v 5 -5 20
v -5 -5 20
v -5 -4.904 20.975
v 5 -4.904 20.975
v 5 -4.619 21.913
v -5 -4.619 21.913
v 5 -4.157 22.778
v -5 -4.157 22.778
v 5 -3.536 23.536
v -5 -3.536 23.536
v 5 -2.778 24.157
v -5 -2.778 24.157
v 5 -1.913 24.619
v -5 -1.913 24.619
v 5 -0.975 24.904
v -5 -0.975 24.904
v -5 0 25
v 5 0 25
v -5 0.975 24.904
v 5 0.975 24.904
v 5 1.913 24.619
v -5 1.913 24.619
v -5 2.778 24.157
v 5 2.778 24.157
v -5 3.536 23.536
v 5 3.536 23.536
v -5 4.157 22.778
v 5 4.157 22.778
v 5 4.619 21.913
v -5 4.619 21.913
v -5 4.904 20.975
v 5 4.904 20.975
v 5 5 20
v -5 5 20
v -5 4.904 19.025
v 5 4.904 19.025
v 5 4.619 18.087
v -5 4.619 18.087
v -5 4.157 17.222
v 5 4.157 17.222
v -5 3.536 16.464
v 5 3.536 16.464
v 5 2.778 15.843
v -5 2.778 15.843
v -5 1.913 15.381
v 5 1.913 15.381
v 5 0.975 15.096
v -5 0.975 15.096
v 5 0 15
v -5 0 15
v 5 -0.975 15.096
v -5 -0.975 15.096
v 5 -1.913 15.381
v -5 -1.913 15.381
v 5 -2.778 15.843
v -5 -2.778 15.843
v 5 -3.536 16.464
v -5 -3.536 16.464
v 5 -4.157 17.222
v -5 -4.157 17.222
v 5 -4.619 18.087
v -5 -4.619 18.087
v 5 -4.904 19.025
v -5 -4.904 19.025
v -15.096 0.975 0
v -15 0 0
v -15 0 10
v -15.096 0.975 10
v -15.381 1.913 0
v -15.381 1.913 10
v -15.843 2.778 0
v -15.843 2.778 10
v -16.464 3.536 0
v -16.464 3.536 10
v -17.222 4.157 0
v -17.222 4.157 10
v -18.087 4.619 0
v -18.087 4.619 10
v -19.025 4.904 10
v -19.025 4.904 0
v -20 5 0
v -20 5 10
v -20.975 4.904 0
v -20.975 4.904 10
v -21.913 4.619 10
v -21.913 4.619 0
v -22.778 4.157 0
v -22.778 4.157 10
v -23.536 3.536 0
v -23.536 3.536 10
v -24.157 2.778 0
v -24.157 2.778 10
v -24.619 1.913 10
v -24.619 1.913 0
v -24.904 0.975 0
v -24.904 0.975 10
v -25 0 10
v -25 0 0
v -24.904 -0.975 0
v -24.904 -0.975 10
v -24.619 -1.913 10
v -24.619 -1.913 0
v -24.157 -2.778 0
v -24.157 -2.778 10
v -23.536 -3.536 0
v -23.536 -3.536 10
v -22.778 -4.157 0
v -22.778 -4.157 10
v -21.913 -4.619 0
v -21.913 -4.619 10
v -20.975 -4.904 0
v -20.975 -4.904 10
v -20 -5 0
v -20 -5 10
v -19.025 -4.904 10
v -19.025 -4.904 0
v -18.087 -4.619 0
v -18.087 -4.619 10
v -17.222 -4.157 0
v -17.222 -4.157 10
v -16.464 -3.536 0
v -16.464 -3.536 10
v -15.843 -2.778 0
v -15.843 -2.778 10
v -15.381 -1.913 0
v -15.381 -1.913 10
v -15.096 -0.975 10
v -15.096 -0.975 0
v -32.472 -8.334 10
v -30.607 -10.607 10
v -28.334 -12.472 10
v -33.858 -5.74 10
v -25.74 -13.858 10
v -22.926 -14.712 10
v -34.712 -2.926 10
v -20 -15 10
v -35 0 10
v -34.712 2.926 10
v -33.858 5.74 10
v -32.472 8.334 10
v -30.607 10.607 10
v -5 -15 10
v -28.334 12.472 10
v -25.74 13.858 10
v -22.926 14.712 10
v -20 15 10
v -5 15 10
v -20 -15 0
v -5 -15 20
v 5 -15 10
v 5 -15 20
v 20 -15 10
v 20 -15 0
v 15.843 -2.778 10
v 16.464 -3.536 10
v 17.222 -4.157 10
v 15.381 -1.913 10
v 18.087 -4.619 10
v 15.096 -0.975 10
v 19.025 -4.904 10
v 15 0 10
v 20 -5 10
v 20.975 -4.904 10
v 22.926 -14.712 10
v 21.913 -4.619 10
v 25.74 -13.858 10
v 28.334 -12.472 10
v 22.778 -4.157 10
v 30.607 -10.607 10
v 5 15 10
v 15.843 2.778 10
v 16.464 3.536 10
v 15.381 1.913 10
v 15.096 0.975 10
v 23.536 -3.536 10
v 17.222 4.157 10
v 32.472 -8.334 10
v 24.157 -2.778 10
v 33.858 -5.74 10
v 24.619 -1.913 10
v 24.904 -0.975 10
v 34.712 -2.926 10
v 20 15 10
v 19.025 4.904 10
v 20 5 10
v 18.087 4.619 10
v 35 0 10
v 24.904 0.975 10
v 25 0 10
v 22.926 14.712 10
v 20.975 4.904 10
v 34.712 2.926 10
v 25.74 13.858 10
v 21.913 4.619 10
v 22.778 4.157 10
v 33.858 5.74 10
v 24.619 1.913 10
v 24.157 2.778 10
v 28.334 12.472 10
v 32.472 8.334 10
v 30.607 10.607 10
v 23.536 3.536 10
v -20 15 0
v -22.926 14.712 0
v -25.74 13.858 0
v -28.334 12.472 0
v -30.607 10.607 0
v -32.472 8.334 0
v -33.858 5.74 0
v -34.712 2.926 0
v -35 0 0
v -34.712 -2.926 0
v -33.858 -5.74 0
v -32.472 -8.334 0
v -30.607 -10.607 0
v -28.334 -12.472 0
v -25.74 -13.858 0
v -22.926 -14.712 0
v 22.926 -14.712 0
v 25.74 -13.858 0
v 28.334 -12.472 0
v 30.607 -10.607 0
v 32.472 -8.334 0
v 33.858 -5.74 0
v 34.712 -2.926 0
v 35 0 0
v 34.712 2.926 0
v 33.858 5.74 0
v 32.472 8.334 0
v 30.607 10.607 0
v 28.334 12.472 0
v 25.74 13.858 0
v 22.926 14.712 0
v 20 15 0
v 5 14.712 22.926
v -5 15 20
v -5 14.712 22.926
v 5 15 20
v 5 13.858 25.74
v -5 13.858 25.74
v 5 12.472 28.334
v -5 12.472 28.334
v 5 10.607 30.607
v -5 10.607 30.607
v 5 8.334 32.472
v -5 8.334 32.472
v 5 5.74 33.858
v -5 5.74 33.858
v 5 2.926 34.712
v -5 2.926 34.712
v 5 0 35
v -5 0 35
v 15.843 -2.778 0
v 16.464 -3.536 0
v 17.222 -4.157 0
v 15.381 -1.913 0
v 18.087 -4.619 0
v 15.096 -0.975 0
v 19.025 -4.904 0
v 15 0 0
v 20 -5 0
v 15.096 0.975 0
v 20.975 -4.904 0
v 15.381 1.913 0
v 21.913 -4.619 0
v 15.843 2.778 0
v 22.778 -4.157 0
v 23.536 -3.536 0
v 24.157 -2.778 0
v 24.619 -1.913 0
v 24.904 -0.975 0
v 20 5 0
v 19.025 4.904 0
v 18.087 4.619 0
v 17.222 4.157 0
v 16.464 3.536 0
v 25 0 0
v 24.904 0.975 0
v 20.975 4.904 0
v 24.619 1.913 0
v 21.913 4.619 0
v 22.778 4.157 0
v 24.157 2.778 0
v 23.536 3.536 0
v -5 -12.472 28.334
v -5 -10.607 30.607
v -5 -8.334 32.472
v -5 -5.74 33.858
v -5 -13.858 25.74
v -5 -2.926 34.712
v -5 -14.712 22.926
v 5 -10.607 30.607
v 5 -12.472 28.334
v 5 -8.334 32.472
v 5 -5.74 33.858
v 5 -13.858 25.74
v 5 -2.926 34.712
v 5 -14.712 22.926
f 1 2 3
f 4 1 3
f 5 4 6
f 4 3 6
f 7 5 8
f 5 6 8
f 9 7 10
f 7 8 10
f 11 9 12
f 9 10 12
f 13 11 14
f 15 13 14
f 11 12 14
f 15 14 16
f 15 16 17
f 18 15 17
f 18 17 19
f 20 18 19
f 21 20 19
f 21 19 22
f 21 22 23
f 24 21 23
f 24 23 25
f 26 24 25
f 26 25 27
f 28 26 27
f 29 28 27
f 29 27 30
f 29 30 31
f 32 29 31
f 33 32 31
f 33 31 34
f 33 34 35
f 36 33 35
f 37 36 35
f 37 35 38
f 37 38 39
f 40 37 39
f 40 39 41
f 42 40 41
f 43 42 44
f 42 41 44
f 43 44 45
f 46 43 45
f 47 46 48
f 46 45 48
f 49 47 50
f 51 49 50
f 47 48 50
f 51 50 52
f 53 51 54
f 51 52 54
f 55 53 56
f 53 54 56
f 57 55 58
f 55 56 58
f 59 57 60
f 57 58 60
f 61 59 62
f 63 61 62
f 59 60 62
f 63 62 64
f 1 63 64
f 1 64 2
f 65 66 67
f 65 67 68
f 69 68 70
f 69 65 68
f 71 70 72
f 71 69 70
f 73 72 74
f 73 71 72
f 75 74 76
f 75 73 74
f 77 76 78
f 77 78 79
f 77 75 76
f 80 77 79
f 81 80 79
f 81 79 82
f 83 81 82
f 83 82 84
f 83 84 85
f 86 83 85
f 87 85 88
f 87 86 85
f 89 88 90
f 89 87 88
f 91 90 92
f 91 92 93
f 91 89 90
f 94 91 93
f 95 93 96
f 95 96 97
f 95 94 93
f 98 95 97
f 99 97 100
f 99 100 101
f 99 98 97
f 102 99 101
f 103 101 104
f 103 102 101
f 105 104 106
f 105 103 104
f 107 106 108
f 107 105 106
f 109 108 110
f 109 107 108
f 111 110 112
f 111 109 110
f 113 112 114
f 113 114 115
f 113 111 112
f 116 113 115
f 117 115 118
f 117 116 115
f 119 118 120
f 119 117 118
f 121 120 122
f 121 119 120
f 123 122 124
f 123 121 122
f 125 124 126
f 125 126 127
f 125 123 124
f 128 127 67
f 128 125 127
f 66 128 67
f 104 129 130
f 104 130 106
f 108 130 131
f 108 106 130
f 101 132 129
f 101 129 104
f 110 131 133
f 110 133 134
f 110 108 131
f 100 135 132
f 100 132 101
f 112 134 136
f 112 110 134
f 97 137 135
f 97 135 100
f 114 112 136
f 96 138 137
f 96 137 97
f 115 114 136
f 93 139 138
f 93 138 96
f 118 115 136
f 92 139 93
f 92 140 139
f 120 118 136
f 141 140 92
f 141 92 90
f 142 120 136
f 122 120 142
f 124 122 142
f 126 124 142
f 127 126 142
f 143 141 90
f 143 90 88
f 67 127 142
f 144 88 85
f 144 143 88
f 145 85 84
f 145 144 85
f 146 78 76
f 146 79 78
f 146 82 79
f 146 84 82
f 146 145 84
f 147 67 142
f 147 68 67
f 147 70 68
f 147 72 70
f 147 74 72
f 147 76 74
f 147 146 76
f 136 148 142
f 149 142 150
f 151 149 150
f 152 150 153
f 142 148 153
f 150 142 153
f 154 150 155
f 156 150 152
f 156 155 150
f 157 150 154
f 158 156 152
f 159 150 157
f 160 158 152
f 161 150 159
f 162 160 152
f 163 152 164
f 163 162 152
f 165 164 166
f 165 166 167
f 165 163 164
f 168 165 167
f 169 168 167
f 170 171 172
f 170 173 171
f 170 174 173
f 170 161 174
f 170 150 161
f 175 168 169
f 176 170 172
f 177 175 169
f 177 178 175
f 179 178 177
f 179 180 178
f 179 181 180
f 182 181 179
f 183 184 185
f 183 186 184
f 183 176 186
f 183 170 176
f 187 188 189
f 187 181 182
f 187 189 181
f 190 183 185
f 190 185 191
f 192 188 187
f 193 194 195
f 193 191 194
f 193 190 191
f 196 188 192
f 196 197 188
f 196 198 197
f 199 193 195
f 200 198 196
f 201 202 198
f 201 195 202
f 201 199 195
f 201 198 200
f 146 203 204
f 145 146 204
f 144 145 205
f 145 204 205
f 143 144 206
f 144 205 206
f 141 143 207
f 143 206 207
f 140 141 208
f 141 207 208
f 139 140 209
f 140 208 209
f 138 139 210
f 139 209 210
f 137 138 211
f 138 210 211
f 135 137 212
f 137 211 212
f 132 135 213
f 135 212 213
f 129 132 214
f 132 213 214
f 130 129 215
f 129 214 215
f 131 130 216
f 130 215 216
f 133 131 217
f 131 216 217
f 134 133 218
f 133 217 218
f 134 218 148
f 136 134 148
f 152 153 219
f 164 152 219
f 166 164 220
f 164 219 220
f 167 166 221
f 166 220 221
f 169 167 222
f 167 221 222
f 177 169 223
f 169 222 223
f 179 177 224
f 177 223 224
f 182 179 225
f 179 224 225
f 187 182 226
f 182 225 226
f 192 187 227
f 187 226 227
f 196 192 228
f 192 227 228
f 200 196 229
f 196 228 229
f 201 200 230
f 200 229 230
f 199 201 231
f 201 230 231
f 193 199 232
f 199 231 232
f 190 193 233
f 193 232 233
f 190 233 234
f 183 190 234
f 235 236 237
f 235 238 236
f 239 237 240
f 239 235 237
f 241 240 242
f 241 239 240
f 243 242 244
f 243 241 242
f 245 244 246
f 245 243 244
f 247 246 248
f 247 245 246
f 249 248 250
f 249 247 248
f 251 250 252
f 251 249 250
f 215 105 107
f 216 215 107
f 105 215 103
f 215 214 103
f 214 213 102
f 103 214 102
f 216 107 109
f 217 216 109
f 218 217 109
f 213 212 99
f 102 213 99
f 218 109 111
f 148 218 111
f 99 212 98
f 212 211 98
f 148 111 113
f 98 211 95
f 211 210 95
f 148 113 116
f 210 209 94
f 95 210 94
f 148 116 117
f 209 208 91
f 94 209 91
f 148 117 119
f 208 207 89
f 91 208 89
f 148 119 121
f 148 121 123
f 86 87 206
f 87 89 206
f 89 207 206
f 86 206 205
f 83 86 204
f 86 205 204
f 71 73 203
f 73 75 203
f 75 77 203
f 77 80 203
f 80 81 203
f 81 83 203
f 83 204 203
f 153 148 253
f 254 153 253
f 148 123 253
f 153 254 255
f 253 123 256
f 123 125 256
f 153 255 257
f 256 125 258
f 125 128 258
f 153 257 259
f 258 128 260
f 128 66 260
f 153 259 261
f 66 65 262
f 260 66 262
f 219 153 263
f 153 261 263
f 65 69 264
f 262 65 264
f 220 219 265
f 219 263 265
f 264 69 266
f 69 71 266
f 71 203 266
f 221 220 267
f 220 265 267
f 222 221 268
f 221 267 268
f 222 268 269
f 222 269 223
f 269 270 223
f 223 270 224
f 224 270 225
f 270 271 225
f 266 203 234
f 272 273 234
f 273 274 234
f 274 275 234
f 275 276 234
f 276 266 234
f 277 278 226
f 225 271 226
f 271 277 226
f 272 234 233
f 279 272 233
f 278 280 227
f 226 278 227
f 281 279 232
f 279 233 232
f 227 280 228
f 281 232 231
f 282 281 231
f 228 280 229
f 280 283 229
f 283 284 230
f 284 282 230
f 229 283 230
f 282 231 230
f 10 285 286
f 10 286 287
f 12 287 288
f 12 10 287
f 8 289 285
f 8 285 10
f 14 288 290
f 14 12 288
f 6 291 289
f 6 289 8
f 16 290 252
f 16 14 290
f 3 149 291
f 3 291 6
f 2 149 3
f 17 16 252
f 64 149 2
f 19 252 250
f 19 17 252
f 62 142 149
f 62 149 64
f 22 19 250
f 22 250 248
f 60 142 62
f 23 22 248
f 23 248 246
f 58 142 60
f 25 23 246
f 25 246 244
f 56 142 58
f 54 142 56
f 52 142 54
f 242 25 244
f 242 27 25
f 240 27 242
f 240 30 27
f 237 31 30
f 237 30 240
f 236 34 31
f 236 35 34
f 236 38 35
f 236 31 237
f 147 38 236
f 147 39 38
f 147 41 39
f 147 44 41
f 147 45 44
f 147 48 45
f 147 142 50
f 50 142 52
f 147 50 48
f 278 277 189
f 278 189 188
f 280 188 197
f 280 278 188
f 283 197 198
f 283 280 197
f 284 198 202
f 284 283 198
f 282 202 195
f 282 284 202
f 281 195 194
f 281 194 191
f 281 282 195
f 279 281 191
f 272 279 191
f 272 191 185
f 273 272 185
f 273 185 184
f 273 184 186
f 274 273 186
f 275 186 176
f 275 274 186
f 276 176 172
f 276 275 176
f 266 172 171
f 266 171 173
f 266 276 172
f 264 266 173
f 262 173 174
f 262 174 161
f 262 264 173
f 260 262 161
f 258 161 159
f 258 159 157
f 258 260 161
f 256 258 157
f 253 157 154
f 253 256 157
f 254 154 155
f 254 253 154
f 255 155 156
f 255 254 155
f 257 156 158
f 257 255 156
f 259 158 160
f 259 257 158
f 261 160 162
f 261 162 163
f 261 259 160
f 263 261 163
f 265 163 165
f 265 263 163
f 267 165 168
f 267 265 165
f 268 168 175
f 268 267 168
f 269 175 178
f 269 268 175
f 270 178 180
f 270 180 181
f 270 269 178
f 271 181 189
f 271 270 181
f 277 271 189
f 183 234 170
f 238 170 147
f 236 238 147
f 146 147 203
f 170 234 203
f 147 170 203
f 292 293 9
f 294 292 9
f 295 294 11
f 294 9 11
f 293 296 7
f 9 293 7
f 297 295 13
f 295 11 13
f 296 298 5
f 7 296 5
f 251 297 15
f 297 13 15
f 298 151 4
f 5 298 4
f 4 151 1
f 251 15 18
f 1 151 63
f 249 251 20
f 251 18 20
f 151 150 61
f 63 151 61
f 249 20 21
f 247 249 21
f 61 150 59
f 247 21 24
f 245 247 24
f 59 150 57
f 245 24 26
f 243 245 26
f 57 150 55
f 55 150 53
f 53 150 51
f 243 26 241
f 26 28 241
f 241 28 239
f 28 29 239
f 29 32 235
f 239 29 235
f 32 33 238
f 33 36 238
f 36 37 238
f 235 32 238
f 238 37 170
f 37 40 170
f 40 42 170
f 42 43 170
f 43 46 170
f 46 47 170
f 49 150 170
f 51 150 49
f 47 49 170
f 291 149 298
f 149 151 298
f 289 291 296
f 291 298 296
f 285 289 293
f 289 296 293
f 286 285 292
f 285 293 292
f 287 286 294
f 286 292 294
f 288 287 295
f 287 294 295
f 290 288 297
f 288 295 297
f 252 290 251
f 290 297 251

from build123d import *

# Parameters (mm, degrees)
F0_R     = 5
F0_W     = 10
F0_H     = 30
F1_DEPTH = 10
F2_DEPTH = 35
F3_R     = 14.99999
F5_D     = 10


# Not quite as in the source:
# - a fillet or chamfer is up to 0.001 mm smaller than in the source, because OpenCascade refuses the exact size


with BuildPart() as f1:
    # F0 (on Top) → F1 (new body)
    with BuildSketch(Plane.XY):
        with BuildLine():
            ThreePointArc((-20, 15), (-35, 0), (-20, -15))
            Line((-20, -15), (-5, -15))
            Line((-5, -15), (-5, 15))
            Line((-5, 15), (-20, 15))
        make_face()
        with Locations((-20, 0)):
            Circle(F0_R, mode=Mode.SUBTRACT)
        with BuildLine():
            Line((5, 15), (5, -15))
            Line((5, -15), (20, -15))
            ThreePointArc((20, -15), (35, 0), (20, 15))
            Line((20, 15), (5, 15))
        make_face()
        with Locations((20, 0)):
            Circle(F0_R, mode=Mode.SUBTRACT)
        Rectangle(F0_W, F0_H)
    extrude(amount=F1_DEPTH)

    # F0 (on Top) → F2 (join)
    with BuildSketch(Plane.XY):
        Rectangle(F0_W, F0_H)
    extrude(amount=F2_DEPTH)

    # F3 (radius 15 in the source; OpenCascade refuses exactly that, so slightly less here)
    f3_edges = [f1.edges().sort_by_distance(p)[0] for p in [
        (0, -15, 35),
        (0, 15, 35),
    ]]
    fillet(f3_edges, radius=F3_R)

    # F5 (through all)
    with Locations(Plane.YZ.offset(5)):
        with Locations((0, 20)):
            Hole(F5_D / 2)


solid = f1.part
